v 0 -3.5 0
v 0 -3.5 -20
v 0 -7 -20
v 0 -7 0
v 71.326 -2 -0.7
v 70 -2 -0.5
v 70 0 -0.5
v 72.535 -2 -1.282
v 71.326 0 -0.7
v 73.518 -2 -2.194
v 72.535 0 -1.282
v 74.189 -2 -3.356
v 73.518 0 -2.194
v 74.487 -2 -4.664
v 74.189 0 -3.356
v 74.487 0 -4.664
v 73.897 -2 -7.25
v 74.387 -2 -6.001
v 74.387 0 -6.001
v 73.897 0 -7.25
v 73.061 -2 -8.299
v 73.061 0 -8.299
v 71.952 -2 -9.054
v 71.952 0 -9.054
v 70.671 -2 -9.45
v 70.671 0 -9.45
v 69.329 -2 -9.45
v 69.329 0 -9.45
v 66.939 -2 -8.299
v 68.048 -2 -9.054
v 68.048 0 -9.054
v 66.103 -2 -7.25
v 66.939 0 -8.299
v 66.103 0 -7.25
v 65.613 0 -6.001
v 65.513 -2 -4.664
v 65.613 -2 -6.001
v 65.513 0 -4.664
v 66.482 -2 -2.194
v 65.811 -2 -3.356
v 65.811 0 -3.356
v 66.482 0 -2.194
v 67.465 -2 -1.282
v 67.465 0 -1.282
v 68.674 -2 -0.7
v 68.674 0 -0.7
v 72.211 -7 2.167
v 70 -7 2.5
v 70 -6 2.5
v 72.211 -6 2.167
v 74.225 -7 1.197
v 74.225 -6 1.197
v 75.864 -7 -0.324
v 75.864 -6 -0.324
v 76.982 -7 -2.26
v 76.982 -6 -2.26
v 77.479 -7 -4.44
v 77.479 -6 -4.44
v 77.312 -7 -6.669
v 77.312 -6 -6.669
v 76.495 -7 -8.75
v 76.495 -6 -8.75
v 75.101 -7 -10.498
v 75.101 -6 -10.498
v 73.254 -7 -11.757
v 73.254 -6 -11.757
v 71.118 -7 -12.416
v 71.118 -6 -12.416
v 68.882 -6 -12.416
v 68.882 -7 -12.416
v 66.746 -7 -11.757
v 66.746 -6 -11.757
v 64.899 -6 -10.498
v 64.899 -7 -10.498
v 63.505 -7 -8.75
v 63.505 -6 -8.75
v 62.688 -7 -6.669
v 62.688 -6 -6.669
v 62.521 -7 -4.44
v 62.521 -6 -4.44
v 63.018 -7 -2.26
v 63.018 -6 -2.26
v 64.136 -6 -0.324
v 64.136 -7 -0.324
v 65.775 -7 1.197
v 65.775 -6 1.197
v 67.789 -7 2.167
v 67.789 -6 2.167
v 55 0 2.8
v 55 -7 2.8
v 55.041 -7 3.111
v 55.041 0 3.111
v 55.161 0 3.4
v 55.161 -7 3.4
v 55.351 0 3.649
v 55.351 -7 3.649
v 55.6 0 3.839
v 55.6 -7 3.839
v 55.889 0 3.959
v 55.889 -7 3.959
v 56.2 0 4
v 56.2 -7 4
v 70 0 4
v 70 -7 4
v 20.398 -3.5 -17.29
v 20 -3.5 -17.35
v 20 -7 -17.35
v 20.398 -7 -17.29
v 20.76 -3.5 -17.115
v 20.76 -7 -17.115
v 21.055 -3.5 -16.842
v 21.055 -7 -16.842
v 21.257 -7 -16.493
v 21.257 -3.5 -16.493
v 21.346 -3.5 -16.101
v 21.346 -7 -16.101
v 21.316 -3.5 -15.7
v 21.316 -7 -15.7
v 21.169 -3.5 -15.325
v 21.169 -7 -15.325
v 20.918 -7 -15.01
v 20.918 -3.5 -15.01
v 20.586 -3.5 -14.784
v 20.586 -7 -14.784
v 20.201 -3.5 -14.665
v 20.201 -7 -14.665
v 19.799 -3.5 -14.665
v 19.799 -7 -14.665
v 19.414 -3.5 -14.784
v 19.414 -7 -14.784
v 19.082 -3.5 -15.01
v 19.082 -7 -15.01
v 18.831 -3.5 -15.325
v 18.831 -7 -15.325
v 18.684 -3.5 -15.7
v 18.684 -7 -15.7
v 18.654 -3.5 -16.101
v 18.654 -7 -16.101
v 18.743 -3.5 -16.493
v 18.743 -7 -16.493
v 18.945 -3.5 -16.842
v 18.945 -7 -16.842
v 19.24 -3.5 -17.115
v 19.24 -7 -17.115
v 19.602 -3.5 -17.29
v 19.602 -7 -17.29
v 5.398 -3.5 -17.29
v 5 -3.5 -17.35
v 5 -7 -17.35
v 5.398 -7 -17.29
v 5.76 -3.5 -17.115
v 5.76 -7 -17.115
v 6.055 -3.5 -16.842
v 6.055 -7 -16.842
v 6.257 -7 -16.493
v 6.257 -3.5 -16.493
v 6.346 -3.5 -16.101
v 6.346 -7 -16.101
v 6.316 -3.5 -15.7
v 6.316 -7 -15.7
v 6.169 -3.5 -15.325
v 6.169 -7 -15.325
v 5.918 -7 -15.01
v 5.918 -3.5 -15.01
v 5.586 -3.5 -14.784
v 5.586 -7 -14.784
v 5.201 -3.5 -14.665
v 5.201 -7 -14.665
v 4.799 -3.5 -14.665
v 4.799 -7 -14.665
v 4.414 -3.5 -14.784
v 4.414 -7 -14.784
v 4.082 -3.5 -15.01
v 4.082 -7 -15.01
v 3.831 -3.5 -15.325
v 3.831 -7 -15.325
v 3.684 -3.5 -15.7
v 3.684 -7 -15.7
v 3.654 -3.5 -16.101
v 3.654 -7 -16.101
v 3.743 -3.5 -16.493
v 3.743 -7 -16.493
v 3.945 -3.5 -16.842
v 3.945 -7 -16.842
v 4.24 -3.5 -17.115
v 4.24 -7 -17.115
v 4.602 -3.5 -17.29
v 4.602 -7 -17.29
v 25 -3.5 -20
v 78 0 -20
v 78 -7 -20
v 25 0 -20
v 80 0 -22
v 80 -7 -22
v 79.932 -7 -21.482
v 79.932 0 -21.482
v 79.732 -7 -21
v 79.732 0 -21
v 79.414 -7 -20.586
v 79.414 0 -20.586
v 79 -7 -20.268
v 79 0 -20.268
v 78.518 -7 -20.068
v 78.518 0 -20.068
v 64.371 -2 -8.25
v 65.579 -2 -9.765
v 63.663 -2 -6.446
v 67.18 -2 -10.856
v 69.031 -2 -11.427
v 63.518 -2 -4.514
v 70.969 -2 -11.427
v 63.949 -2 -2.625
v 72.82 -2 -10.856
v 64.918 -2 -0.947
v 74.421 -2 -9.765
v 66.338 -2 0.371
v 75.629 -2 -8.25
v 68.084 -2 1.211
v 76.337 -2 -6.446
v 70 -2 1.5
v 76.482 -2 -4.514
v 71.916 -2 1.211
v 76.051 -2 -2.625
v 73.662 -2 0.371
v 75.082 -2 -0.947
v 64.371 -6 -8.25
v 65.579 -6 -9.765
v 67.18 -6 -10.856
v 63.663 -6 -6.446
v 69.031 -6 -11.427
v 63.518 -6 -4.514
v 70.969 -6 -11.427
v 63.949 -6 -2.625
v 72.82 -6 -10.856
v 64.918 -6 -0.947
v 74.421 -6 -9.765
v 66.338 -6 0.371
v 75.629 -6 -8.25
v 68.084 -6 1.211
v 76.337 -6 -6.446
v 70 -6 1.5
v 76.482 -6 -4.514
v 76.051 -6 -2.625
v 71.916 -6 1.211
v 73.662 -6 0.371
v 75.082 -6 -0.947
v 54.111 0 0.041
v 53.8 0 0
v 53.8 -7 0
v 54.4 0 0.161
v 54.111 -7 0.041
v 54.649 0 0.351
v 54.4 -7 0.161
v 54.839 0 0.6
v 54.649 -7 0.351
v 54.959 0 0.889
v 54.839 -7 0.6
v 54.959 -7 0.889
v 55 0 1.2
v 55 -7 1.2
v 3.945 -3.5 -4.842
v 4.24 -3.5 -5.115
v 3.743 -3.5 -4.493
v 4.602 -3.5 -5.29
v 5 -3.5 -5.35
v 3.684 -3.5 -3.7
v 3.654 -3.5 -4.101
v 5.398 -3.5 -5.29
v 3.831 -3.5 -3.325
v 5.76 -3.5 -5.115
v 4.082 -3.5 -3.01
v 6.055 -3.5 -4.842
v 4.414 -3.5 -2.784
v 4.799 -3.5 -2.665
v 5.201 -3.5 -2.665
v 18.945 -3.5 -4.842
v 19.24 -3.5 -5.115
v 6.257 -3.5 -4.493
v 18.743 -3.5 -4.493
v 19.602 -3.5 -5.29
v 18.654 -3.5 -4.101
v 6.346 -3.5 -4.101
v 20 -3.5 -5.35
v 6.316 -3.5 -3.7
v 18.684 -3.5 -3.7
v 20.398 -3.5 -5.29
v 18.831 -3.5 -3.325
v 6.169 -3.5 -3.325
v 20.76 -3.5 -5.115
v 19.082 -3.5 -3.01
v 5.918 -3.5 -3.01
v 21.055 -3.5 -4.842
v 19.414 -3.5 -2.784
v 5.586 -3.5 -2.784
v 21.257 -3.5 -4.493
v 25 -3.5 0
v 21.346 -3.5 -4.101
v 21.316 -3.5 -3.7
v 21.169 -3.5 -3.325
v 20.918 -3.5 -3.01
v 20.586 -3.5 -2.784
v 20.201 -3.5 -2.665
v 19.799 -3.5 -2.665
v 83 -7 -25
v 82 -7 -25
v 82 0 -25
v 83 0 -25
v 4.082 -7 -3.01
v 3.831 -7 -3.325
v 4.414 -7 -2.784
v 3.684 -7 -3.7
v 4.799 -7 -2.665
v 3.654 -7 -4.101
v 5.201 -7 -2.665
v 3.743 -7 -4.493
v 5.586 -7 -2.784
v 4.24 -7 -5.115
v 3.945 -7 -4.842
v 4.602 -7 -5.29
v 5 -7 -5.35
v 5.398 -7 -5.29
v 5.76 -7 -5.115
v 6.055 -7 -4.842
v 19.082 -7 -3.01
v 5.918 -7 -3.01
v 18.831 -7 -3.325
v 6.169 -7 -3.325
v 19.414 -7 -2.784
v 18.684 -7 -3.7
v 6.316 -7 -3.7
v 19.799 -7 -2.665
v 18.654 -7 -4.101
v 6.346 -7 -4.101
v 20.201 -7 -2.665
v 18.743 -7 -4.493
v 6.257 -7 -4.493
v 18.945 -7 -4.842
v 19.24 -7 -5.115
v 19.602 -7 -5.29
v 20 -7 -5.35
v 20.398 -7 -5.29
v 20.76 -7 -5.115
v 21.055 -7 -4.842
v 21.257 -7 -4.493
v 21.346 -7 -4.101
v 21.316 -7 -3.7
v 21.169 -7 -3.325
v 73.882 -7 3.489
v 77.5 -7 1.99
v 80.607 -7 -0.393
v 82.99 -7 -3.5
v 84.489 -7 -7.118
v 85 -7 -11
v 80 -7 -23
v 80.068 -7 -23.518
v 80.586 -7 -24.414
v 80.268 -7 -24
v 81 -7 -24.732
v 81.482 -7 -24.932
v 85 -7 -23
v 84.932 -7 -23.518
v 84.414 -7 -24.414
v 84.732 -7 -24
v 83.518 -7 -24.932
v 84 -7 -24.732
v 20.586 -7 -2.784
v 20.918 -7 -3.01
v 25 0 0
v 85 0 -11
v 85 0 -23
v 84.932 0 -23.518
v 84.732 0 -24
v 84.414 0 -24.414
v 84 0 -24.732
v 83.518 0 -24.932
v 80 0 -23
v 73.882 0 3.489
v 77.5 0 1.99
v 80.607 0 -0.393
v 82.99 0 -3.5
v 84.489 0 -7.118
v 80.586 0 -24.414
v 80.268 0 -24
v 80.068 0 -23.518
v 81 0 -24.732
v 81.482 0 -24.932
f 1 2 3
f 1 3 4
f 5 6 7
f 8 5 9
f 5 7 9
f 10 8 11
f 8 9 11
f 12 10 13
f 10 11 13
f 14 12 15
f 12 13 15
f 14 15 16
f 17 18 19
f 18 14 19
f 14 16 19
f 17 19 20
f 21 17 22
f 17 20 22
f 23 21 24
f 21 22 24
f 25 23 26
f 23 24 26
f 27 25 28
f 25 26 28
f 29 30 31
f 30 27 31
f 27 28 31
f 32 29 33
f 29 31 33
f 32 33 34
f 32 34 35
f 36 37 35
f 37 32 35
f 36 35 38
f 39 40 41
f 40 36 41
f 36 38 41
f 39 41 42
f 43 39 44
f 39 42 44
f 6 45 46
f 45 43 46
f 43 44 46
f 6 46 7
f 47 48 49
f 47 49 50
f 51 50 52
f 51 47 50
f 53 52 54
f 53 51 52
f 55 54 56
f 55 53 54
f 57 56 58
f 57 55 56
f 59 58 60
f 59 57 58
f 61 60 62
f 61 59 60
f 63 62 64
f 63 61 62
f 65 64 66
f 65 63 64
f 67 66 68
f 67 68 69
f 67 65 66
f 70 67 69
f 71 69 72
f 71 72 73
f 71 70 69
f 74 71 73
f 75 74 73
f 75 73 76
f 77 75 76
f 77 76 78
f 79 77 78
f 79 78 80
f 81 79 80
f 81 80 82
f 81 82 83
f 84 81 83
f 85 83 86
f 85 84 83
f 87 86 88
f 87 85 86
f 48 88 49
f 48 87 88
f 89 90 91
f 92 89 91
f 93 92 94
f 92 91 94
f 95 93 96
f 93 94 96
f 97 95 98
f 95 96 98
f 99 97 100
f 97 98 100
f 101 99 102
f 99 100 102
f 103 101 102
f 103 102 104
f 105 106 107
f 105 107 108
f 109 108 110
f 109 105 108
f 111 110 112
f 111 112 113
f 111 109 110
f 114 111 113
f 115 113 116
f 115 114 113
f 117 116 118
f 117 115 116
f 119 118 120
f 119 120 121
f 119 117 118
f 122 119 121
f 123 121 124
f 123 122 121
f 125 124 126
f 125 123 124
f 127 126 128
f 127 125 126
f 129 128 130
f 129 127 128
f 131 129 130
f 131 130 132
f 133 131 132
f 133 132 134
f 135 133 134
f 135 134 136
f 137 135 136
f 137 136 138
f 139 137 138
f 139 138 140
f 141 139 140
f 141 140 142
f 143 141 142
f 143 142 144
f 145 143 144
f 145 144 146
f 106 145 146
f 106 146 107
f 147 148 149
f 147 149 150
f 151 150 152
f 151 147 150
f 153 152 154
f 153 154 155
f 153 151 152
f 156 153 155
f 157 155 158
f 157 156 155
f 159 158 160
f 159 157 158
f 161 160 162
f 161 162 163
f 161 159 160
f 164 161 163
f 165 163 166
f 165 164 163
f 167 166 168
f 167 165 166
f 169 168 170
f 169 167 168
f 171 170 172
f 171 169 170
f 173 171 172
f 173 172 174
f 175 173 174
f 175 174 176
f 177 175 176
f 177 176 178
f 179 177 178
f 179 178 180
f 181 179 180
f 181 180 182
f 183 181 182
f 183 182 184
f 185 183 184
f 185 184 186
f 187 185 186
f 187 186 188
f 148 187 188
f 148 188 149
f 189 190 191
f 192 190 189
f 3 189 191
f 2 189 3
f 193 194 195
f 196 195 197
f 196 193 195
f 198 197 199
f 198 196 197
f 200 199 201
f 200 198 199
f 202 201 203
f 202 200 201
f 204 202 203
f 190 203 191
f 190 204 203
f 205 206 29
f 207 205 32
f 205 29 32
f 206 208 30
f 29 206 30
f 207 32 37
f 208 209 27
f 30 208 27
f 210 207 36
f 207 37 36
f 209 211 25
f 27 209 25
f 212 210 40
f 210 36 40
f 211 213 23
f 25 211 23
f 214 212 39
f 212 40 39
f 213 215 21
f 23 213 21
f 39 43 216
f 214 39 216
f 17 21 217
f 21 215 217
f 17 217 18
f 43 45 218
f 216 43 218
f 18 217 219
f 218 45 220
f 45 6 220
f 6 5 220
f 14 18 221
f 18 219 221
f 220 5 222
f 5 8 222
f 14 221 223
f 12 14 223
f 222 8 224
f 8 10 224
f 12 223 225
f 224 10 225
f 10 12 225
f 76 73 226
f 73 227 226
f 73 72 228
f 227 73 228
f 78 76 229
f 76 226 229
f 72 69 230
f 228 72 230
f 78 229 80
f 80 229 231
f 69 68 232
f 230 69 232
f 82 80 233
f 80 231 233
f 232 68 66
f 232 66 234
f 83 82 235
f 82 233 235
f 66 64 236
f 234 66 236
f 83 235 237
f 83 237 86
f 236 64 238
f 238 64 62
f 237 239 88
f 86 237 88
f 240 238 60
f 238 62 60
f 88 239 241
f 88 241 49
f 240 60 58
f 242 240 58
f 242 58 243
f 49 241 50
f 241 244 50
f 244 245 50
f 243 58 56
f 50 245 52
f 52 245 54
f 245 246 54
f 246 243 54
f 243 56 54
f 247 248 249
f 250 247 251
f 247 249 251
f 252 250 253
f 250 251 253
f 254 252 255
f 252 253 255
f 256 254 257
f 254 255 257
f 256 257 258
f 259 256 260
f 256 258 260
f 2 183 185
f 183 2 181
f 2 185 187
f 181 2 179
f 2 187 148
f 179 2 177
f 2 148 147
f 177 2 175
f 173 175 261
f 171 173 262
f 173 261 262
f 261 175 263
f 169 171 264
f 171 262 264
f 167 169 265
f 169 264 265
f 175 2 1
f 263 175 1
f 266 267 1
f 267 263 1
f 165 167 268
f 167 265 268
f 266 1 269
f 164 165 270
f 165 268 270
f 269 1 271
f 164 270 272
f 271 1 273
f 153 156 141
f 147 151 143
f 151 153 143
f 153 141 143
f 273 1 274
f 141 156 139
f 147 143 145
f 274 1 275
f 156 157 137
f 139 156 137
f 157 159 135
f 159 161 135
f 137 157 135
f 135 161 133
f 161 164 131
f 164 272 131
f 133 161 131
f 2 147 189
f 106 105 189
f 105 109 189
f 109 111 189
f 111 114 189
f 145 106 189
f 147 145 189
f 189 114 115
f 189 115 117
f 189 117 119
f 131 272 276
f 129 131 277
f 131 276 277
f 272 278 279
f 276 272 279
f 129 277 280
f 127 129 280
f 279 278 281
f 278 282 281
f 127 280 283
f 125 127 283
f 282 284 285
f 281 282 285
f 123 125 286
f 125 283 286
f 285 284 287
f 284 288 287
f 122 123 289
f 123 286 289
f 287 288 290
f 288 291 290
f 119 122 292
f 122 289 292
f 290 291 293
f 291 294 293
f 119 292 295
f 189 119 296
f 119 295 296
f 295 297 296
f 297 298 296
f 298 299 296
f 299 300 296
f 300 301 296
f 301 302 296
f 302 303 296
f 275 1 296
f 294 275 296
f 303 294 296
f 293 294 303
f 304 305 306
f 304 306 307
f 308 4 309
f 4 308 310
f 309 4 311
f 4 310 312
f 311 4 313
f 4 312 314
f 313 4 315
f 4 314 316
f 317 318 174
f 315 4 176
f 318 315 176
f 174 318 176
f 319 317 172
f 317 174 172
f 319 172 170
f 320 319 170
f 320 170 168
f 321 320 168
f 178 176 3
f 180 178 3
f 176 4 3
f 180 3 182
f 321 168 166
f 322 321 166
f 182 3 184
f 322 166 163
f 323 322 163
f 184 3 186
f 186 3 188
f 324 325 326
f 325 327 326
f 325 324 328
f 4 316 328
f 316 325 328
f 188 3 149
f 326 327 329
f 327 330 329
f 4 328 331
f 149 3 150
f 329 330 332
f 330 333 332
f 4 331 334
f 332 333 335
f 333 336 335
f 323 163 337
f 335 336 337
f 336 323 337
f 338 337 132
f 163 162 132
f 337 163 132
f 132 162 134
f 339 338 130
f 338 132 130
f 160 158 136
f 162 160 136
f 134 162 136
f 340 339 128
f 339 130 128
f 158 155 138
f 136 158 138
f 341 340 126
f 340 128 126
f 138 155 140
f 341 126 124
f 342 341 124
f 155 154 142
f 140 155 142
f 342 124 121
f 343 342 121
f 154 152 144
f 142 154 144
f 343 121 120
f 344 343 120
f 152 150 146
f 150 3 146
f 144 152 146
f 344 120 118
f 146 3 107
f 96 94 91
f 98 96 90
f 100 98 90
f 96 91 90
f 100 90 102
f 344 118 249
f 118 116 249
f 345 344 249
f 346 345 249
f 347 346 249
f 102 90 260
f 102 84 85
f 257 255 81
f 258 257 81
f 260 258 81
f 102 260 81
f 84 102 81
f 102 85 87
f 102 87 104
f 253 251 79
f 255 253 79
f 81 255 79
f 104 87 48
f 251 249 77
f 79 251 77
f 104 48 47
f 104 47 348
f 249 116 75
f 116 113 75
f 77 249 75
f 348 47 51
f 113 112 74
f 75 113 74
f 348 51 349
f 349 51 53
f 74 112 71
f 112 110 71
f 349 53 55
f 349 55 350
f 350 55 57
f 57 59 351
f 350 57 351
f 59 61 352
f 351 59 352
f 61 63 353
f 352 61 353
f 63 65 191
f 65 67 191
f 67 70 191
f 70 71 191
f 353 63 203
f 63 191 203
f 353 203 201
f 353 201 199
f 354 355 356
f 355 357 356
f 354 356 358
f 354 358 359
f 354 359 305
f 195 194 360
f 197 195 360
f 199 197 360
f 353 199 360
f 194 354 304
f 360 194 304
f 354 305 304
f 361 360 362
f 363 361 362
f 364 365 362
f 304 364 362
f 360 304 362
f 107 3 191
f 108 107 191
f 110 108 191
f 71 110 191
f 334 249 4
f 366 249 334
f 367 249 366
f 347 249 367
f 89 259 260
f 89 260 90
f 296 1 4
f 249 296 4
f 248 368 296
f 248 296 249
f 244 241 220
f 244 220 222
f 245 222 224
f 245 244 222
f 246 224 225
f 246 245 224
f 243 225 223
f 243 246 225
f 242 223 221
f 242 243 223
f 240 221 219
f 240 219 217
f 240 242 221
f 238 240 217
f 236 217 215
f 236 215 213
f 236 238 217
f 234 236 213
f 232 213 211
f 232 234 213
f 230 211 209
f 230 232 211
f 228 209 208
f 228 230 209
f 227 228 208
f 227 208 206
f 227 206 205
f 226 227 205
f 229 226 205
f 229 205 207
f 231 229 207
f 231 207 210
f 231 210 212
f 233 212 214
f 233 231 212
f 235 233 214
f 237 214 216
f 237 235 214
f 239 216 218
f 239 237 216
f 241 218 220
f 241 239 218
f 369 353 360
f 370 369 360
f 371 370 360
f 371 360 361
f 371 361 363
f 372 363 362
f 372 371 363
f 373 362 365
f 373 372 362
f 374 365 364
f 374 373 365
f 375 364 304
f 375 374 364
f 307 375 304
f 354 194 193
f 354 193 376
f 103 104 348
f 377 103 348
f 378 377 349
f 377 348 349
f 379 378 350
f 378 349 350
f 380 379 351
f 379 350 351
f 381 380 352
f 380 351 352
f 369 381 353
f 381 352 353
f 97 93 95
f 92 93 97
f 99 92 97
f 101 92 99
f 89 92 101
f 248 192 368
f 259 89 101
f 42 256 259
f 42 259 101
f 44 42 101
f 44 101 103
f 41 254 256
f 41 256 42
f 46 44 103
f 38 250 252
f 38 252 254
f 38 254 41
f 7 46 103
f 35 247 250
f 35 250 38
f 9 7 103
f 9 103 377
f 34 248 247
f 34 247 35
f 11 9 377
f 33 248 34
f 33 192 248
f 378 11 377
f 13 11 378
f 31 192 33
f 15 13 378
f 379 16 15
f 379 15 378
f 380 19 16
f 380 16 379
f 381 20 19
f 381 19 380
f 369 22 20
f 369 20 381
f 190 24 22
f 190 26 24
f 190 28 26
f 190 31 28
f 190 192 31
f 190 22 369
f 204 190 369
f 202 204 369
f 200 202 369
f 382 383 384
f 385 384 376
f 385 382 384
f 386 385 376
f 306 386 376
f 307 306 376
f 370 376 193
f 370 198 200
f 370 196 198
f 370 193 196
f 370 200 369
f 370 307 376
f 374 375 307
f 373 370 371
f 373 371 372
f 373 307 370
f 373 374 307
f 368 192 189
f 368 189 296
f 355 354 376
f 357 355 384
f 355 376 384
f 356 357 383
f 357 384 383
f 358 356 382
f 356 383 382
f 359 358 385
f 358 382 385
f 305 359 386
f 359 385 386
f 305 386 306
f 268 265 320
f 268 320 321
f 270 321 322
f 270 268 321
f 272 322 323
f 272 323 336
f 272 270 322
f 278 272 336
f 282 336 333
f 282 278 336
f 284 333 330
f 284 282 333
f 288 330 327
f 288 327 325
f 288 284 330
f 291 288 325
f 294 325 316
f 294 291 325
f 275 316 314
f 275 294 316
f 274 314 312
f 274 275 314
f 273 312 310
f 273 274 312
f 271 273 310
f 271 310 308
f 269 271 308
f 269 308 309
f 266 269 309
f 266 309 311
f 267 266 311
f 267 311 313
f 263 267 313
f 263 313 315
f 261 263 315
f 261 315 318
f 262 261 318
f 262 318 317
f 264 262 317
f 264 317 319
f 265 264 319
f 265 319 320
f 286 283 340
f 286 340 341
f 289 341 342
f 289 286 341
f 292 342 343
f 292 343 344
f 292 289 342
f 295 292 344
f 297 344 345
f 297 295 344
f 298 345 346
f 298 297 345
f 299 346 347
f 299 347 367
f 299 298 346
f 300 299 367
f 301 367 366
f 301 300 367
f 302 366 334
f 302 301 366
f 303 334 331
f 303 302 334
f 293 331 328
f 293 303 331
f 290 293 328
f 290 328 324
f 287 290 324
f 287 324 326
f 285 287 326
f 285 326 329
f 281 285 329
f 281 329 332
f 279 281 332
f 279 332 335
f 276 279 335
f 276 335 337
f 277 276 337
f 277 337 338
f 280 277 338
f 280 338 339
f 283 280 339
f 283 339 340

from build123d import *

# Parameters (mm, degrees)
SKETCH1_R           = 4.5
BOSS_EXTRUDE1_DEPTH = 7
SKETCH2_W           = 25
SKETCH2_H           = 20
CUT_EXTRUDE1_DEPTH  = 3.5
SKETCH3_R           = 1.35
CUT_EXTRUDE2_DEPTH  = 14
FILLET2_R           = 1.2
SKETCH4_R           = 7.5
CUT_EXTRUDE3_DEPTH  = 1
SKETCH5_R           = 6.5
CUT_EXTRUDE4_DEPTH  = 4
FILLET3_R           = 15
SKETCH6_W           = 5
SKETCH6_H           = 5
BOSS_EXTRUDE2_DEPTH = 7
FILLET4_R           = 2
SKETCH7_W           = 110.688595786
SKETCH7_H           = 55.300338959
CUT_EXTRUDE5_DEPTH  = 7


with BuildPart() as part:
    # Sketch1 → Boss-Extrude1 (new body)
    with BuildSketch(Plane(origin=(0, 0, 0), x_dir=(1, 0, 0), z_dir=(0, 1, 0))):
        Polygon((0, 0), (55, 0), (55, -4), (85, -4), (85, 0), (85, 20), (0, 20), align=None)
        with Locations(Location((70, 5, 0), (0, 0, 270))):
            Circle(SKETCH1_R, mode=Mode.SUBTRACT)
    extrude(amount=BOSS_EXTRUDE1_DEPTH)

    # Sketch2 → Cut-Extrude1 (cut)
    with BuildSketch(Plane.XZ):
        with Locations((12.5, -10)):
            Rectangle(SKETCH2_W, SKETCH2_H)
    extrude(amount=-CUT_EXTRUDE1_DEPTH, mode=Mode.SUBTRACT)

    # Sketch3 → Cut-Extrude2 (cut)
    with BuildSketch(Plane.XZ.offset(-3.5)):
        with Locations(Location((5, -4, 0), (0, 0, 270))):
            Circle(SKETCH3_R)
        with Locations(Location((20, -4, 0), (0, 0, 270))):
            Circle(SKETCH3_R)
        with Locations(Location((20, -16, 0), (0, 0, 270))):
            Circle(SKETCH3_R)
        with Locations(Location((5, -16, 0), (0, 0, 270))):
            Circle(SKETCH3_R)
    extrude(amount=-CUT_EXTRUDE2_DEPTH, mode=Mode.SUBTRACT)

    # Fillet2
    fillet2_edges = [part.edges().sort_by_distance(p)[0] for p in [
        (55, 3.5, 4),
        (55, 3.5, 0),
    ]]
    fillet(fillet2_edges, radius=FILLET2_R)

    # Sketch4 → Cut-Extrude3 (cut)
    with BuildSketch(Plane(origin=(0, 7, 0), x_dir=(1, 0, 0), z_dir=(0, 1, 0))):
        with Locations(Location((70, 5, 0), (0, 0, 270))):
            Circle(SKETCH4_R)
    extrude(amount=-CUT_EXTRUDE3_DEPTH, mode=Mode.SUBTRACT)

    # Sketch5 → Cut-Extrude4 (cut)
    with BuildSketch(Plane(origin=(0, 6, 0), x_dir=(1, 0, 0), z_dir=(0, 1, 0))):
        with Locations(Location((70, 5, 0), (0, 0, 270))):
            Circle(SKETCH5_R)
    extrude(amount=-CUT_EXTRUDE4_DEPTH, mode=Mode.SUBTRACT)

    # Fillet3
    fillet3_edges = [part.edges().sort_by_distance(p)[0] for p in [
        (85, 3.5, 4),
    ]]
    fillet(fillet3_edges, radius=FILLET3_R)

    # Sketch6 → Boss-Extrude2 (add)
    with BuildSketch(Plane(origin=(0, 7, 0), x_dir=(1, 0, 0), z_dir=(0, 1, 0))):
        with Locations((82.5, 22.5)):
            Rectangle(SKETCH6_W, SKETCH6_H)
    extrude(amount=-BOSS_EXTRUDE2_DEPTH)

    # Fillet4
    fillet4_edges = [part.edges().sort_by_distance(p)[0] for p in [
        (80, 3.5, -25),
        (80, 3.5, -20),
        (85, 3.5, -25),
    ]]
    fillet(fillet4_edges, radius=FILLET4_R)

    # Mirror1: part across plane


with BuildPart() as part_1:
    add(part.part)
    add(part.part.mirror(Plane(origin=(0, 0, 0), x_dir=(0, 0, 1), z_dir=(0, -1, 0))))

    # Sketch7 → Cut-Extrude5 (cut)
    with BuildSketch(Plane(origin=(0, 7, 0), x_dir=(1, 0, 0), z_dir=(0, 1, 0))):
        with Locations((37.884311931, 10.917741369)):
            Rectangle(SKETCH7_W, SKETCH7_H)
    extrude(amount=-CUT_EXTRUDE5_DEPTH, mode=Mode.SUBTRACT)


solid = part_1.part
